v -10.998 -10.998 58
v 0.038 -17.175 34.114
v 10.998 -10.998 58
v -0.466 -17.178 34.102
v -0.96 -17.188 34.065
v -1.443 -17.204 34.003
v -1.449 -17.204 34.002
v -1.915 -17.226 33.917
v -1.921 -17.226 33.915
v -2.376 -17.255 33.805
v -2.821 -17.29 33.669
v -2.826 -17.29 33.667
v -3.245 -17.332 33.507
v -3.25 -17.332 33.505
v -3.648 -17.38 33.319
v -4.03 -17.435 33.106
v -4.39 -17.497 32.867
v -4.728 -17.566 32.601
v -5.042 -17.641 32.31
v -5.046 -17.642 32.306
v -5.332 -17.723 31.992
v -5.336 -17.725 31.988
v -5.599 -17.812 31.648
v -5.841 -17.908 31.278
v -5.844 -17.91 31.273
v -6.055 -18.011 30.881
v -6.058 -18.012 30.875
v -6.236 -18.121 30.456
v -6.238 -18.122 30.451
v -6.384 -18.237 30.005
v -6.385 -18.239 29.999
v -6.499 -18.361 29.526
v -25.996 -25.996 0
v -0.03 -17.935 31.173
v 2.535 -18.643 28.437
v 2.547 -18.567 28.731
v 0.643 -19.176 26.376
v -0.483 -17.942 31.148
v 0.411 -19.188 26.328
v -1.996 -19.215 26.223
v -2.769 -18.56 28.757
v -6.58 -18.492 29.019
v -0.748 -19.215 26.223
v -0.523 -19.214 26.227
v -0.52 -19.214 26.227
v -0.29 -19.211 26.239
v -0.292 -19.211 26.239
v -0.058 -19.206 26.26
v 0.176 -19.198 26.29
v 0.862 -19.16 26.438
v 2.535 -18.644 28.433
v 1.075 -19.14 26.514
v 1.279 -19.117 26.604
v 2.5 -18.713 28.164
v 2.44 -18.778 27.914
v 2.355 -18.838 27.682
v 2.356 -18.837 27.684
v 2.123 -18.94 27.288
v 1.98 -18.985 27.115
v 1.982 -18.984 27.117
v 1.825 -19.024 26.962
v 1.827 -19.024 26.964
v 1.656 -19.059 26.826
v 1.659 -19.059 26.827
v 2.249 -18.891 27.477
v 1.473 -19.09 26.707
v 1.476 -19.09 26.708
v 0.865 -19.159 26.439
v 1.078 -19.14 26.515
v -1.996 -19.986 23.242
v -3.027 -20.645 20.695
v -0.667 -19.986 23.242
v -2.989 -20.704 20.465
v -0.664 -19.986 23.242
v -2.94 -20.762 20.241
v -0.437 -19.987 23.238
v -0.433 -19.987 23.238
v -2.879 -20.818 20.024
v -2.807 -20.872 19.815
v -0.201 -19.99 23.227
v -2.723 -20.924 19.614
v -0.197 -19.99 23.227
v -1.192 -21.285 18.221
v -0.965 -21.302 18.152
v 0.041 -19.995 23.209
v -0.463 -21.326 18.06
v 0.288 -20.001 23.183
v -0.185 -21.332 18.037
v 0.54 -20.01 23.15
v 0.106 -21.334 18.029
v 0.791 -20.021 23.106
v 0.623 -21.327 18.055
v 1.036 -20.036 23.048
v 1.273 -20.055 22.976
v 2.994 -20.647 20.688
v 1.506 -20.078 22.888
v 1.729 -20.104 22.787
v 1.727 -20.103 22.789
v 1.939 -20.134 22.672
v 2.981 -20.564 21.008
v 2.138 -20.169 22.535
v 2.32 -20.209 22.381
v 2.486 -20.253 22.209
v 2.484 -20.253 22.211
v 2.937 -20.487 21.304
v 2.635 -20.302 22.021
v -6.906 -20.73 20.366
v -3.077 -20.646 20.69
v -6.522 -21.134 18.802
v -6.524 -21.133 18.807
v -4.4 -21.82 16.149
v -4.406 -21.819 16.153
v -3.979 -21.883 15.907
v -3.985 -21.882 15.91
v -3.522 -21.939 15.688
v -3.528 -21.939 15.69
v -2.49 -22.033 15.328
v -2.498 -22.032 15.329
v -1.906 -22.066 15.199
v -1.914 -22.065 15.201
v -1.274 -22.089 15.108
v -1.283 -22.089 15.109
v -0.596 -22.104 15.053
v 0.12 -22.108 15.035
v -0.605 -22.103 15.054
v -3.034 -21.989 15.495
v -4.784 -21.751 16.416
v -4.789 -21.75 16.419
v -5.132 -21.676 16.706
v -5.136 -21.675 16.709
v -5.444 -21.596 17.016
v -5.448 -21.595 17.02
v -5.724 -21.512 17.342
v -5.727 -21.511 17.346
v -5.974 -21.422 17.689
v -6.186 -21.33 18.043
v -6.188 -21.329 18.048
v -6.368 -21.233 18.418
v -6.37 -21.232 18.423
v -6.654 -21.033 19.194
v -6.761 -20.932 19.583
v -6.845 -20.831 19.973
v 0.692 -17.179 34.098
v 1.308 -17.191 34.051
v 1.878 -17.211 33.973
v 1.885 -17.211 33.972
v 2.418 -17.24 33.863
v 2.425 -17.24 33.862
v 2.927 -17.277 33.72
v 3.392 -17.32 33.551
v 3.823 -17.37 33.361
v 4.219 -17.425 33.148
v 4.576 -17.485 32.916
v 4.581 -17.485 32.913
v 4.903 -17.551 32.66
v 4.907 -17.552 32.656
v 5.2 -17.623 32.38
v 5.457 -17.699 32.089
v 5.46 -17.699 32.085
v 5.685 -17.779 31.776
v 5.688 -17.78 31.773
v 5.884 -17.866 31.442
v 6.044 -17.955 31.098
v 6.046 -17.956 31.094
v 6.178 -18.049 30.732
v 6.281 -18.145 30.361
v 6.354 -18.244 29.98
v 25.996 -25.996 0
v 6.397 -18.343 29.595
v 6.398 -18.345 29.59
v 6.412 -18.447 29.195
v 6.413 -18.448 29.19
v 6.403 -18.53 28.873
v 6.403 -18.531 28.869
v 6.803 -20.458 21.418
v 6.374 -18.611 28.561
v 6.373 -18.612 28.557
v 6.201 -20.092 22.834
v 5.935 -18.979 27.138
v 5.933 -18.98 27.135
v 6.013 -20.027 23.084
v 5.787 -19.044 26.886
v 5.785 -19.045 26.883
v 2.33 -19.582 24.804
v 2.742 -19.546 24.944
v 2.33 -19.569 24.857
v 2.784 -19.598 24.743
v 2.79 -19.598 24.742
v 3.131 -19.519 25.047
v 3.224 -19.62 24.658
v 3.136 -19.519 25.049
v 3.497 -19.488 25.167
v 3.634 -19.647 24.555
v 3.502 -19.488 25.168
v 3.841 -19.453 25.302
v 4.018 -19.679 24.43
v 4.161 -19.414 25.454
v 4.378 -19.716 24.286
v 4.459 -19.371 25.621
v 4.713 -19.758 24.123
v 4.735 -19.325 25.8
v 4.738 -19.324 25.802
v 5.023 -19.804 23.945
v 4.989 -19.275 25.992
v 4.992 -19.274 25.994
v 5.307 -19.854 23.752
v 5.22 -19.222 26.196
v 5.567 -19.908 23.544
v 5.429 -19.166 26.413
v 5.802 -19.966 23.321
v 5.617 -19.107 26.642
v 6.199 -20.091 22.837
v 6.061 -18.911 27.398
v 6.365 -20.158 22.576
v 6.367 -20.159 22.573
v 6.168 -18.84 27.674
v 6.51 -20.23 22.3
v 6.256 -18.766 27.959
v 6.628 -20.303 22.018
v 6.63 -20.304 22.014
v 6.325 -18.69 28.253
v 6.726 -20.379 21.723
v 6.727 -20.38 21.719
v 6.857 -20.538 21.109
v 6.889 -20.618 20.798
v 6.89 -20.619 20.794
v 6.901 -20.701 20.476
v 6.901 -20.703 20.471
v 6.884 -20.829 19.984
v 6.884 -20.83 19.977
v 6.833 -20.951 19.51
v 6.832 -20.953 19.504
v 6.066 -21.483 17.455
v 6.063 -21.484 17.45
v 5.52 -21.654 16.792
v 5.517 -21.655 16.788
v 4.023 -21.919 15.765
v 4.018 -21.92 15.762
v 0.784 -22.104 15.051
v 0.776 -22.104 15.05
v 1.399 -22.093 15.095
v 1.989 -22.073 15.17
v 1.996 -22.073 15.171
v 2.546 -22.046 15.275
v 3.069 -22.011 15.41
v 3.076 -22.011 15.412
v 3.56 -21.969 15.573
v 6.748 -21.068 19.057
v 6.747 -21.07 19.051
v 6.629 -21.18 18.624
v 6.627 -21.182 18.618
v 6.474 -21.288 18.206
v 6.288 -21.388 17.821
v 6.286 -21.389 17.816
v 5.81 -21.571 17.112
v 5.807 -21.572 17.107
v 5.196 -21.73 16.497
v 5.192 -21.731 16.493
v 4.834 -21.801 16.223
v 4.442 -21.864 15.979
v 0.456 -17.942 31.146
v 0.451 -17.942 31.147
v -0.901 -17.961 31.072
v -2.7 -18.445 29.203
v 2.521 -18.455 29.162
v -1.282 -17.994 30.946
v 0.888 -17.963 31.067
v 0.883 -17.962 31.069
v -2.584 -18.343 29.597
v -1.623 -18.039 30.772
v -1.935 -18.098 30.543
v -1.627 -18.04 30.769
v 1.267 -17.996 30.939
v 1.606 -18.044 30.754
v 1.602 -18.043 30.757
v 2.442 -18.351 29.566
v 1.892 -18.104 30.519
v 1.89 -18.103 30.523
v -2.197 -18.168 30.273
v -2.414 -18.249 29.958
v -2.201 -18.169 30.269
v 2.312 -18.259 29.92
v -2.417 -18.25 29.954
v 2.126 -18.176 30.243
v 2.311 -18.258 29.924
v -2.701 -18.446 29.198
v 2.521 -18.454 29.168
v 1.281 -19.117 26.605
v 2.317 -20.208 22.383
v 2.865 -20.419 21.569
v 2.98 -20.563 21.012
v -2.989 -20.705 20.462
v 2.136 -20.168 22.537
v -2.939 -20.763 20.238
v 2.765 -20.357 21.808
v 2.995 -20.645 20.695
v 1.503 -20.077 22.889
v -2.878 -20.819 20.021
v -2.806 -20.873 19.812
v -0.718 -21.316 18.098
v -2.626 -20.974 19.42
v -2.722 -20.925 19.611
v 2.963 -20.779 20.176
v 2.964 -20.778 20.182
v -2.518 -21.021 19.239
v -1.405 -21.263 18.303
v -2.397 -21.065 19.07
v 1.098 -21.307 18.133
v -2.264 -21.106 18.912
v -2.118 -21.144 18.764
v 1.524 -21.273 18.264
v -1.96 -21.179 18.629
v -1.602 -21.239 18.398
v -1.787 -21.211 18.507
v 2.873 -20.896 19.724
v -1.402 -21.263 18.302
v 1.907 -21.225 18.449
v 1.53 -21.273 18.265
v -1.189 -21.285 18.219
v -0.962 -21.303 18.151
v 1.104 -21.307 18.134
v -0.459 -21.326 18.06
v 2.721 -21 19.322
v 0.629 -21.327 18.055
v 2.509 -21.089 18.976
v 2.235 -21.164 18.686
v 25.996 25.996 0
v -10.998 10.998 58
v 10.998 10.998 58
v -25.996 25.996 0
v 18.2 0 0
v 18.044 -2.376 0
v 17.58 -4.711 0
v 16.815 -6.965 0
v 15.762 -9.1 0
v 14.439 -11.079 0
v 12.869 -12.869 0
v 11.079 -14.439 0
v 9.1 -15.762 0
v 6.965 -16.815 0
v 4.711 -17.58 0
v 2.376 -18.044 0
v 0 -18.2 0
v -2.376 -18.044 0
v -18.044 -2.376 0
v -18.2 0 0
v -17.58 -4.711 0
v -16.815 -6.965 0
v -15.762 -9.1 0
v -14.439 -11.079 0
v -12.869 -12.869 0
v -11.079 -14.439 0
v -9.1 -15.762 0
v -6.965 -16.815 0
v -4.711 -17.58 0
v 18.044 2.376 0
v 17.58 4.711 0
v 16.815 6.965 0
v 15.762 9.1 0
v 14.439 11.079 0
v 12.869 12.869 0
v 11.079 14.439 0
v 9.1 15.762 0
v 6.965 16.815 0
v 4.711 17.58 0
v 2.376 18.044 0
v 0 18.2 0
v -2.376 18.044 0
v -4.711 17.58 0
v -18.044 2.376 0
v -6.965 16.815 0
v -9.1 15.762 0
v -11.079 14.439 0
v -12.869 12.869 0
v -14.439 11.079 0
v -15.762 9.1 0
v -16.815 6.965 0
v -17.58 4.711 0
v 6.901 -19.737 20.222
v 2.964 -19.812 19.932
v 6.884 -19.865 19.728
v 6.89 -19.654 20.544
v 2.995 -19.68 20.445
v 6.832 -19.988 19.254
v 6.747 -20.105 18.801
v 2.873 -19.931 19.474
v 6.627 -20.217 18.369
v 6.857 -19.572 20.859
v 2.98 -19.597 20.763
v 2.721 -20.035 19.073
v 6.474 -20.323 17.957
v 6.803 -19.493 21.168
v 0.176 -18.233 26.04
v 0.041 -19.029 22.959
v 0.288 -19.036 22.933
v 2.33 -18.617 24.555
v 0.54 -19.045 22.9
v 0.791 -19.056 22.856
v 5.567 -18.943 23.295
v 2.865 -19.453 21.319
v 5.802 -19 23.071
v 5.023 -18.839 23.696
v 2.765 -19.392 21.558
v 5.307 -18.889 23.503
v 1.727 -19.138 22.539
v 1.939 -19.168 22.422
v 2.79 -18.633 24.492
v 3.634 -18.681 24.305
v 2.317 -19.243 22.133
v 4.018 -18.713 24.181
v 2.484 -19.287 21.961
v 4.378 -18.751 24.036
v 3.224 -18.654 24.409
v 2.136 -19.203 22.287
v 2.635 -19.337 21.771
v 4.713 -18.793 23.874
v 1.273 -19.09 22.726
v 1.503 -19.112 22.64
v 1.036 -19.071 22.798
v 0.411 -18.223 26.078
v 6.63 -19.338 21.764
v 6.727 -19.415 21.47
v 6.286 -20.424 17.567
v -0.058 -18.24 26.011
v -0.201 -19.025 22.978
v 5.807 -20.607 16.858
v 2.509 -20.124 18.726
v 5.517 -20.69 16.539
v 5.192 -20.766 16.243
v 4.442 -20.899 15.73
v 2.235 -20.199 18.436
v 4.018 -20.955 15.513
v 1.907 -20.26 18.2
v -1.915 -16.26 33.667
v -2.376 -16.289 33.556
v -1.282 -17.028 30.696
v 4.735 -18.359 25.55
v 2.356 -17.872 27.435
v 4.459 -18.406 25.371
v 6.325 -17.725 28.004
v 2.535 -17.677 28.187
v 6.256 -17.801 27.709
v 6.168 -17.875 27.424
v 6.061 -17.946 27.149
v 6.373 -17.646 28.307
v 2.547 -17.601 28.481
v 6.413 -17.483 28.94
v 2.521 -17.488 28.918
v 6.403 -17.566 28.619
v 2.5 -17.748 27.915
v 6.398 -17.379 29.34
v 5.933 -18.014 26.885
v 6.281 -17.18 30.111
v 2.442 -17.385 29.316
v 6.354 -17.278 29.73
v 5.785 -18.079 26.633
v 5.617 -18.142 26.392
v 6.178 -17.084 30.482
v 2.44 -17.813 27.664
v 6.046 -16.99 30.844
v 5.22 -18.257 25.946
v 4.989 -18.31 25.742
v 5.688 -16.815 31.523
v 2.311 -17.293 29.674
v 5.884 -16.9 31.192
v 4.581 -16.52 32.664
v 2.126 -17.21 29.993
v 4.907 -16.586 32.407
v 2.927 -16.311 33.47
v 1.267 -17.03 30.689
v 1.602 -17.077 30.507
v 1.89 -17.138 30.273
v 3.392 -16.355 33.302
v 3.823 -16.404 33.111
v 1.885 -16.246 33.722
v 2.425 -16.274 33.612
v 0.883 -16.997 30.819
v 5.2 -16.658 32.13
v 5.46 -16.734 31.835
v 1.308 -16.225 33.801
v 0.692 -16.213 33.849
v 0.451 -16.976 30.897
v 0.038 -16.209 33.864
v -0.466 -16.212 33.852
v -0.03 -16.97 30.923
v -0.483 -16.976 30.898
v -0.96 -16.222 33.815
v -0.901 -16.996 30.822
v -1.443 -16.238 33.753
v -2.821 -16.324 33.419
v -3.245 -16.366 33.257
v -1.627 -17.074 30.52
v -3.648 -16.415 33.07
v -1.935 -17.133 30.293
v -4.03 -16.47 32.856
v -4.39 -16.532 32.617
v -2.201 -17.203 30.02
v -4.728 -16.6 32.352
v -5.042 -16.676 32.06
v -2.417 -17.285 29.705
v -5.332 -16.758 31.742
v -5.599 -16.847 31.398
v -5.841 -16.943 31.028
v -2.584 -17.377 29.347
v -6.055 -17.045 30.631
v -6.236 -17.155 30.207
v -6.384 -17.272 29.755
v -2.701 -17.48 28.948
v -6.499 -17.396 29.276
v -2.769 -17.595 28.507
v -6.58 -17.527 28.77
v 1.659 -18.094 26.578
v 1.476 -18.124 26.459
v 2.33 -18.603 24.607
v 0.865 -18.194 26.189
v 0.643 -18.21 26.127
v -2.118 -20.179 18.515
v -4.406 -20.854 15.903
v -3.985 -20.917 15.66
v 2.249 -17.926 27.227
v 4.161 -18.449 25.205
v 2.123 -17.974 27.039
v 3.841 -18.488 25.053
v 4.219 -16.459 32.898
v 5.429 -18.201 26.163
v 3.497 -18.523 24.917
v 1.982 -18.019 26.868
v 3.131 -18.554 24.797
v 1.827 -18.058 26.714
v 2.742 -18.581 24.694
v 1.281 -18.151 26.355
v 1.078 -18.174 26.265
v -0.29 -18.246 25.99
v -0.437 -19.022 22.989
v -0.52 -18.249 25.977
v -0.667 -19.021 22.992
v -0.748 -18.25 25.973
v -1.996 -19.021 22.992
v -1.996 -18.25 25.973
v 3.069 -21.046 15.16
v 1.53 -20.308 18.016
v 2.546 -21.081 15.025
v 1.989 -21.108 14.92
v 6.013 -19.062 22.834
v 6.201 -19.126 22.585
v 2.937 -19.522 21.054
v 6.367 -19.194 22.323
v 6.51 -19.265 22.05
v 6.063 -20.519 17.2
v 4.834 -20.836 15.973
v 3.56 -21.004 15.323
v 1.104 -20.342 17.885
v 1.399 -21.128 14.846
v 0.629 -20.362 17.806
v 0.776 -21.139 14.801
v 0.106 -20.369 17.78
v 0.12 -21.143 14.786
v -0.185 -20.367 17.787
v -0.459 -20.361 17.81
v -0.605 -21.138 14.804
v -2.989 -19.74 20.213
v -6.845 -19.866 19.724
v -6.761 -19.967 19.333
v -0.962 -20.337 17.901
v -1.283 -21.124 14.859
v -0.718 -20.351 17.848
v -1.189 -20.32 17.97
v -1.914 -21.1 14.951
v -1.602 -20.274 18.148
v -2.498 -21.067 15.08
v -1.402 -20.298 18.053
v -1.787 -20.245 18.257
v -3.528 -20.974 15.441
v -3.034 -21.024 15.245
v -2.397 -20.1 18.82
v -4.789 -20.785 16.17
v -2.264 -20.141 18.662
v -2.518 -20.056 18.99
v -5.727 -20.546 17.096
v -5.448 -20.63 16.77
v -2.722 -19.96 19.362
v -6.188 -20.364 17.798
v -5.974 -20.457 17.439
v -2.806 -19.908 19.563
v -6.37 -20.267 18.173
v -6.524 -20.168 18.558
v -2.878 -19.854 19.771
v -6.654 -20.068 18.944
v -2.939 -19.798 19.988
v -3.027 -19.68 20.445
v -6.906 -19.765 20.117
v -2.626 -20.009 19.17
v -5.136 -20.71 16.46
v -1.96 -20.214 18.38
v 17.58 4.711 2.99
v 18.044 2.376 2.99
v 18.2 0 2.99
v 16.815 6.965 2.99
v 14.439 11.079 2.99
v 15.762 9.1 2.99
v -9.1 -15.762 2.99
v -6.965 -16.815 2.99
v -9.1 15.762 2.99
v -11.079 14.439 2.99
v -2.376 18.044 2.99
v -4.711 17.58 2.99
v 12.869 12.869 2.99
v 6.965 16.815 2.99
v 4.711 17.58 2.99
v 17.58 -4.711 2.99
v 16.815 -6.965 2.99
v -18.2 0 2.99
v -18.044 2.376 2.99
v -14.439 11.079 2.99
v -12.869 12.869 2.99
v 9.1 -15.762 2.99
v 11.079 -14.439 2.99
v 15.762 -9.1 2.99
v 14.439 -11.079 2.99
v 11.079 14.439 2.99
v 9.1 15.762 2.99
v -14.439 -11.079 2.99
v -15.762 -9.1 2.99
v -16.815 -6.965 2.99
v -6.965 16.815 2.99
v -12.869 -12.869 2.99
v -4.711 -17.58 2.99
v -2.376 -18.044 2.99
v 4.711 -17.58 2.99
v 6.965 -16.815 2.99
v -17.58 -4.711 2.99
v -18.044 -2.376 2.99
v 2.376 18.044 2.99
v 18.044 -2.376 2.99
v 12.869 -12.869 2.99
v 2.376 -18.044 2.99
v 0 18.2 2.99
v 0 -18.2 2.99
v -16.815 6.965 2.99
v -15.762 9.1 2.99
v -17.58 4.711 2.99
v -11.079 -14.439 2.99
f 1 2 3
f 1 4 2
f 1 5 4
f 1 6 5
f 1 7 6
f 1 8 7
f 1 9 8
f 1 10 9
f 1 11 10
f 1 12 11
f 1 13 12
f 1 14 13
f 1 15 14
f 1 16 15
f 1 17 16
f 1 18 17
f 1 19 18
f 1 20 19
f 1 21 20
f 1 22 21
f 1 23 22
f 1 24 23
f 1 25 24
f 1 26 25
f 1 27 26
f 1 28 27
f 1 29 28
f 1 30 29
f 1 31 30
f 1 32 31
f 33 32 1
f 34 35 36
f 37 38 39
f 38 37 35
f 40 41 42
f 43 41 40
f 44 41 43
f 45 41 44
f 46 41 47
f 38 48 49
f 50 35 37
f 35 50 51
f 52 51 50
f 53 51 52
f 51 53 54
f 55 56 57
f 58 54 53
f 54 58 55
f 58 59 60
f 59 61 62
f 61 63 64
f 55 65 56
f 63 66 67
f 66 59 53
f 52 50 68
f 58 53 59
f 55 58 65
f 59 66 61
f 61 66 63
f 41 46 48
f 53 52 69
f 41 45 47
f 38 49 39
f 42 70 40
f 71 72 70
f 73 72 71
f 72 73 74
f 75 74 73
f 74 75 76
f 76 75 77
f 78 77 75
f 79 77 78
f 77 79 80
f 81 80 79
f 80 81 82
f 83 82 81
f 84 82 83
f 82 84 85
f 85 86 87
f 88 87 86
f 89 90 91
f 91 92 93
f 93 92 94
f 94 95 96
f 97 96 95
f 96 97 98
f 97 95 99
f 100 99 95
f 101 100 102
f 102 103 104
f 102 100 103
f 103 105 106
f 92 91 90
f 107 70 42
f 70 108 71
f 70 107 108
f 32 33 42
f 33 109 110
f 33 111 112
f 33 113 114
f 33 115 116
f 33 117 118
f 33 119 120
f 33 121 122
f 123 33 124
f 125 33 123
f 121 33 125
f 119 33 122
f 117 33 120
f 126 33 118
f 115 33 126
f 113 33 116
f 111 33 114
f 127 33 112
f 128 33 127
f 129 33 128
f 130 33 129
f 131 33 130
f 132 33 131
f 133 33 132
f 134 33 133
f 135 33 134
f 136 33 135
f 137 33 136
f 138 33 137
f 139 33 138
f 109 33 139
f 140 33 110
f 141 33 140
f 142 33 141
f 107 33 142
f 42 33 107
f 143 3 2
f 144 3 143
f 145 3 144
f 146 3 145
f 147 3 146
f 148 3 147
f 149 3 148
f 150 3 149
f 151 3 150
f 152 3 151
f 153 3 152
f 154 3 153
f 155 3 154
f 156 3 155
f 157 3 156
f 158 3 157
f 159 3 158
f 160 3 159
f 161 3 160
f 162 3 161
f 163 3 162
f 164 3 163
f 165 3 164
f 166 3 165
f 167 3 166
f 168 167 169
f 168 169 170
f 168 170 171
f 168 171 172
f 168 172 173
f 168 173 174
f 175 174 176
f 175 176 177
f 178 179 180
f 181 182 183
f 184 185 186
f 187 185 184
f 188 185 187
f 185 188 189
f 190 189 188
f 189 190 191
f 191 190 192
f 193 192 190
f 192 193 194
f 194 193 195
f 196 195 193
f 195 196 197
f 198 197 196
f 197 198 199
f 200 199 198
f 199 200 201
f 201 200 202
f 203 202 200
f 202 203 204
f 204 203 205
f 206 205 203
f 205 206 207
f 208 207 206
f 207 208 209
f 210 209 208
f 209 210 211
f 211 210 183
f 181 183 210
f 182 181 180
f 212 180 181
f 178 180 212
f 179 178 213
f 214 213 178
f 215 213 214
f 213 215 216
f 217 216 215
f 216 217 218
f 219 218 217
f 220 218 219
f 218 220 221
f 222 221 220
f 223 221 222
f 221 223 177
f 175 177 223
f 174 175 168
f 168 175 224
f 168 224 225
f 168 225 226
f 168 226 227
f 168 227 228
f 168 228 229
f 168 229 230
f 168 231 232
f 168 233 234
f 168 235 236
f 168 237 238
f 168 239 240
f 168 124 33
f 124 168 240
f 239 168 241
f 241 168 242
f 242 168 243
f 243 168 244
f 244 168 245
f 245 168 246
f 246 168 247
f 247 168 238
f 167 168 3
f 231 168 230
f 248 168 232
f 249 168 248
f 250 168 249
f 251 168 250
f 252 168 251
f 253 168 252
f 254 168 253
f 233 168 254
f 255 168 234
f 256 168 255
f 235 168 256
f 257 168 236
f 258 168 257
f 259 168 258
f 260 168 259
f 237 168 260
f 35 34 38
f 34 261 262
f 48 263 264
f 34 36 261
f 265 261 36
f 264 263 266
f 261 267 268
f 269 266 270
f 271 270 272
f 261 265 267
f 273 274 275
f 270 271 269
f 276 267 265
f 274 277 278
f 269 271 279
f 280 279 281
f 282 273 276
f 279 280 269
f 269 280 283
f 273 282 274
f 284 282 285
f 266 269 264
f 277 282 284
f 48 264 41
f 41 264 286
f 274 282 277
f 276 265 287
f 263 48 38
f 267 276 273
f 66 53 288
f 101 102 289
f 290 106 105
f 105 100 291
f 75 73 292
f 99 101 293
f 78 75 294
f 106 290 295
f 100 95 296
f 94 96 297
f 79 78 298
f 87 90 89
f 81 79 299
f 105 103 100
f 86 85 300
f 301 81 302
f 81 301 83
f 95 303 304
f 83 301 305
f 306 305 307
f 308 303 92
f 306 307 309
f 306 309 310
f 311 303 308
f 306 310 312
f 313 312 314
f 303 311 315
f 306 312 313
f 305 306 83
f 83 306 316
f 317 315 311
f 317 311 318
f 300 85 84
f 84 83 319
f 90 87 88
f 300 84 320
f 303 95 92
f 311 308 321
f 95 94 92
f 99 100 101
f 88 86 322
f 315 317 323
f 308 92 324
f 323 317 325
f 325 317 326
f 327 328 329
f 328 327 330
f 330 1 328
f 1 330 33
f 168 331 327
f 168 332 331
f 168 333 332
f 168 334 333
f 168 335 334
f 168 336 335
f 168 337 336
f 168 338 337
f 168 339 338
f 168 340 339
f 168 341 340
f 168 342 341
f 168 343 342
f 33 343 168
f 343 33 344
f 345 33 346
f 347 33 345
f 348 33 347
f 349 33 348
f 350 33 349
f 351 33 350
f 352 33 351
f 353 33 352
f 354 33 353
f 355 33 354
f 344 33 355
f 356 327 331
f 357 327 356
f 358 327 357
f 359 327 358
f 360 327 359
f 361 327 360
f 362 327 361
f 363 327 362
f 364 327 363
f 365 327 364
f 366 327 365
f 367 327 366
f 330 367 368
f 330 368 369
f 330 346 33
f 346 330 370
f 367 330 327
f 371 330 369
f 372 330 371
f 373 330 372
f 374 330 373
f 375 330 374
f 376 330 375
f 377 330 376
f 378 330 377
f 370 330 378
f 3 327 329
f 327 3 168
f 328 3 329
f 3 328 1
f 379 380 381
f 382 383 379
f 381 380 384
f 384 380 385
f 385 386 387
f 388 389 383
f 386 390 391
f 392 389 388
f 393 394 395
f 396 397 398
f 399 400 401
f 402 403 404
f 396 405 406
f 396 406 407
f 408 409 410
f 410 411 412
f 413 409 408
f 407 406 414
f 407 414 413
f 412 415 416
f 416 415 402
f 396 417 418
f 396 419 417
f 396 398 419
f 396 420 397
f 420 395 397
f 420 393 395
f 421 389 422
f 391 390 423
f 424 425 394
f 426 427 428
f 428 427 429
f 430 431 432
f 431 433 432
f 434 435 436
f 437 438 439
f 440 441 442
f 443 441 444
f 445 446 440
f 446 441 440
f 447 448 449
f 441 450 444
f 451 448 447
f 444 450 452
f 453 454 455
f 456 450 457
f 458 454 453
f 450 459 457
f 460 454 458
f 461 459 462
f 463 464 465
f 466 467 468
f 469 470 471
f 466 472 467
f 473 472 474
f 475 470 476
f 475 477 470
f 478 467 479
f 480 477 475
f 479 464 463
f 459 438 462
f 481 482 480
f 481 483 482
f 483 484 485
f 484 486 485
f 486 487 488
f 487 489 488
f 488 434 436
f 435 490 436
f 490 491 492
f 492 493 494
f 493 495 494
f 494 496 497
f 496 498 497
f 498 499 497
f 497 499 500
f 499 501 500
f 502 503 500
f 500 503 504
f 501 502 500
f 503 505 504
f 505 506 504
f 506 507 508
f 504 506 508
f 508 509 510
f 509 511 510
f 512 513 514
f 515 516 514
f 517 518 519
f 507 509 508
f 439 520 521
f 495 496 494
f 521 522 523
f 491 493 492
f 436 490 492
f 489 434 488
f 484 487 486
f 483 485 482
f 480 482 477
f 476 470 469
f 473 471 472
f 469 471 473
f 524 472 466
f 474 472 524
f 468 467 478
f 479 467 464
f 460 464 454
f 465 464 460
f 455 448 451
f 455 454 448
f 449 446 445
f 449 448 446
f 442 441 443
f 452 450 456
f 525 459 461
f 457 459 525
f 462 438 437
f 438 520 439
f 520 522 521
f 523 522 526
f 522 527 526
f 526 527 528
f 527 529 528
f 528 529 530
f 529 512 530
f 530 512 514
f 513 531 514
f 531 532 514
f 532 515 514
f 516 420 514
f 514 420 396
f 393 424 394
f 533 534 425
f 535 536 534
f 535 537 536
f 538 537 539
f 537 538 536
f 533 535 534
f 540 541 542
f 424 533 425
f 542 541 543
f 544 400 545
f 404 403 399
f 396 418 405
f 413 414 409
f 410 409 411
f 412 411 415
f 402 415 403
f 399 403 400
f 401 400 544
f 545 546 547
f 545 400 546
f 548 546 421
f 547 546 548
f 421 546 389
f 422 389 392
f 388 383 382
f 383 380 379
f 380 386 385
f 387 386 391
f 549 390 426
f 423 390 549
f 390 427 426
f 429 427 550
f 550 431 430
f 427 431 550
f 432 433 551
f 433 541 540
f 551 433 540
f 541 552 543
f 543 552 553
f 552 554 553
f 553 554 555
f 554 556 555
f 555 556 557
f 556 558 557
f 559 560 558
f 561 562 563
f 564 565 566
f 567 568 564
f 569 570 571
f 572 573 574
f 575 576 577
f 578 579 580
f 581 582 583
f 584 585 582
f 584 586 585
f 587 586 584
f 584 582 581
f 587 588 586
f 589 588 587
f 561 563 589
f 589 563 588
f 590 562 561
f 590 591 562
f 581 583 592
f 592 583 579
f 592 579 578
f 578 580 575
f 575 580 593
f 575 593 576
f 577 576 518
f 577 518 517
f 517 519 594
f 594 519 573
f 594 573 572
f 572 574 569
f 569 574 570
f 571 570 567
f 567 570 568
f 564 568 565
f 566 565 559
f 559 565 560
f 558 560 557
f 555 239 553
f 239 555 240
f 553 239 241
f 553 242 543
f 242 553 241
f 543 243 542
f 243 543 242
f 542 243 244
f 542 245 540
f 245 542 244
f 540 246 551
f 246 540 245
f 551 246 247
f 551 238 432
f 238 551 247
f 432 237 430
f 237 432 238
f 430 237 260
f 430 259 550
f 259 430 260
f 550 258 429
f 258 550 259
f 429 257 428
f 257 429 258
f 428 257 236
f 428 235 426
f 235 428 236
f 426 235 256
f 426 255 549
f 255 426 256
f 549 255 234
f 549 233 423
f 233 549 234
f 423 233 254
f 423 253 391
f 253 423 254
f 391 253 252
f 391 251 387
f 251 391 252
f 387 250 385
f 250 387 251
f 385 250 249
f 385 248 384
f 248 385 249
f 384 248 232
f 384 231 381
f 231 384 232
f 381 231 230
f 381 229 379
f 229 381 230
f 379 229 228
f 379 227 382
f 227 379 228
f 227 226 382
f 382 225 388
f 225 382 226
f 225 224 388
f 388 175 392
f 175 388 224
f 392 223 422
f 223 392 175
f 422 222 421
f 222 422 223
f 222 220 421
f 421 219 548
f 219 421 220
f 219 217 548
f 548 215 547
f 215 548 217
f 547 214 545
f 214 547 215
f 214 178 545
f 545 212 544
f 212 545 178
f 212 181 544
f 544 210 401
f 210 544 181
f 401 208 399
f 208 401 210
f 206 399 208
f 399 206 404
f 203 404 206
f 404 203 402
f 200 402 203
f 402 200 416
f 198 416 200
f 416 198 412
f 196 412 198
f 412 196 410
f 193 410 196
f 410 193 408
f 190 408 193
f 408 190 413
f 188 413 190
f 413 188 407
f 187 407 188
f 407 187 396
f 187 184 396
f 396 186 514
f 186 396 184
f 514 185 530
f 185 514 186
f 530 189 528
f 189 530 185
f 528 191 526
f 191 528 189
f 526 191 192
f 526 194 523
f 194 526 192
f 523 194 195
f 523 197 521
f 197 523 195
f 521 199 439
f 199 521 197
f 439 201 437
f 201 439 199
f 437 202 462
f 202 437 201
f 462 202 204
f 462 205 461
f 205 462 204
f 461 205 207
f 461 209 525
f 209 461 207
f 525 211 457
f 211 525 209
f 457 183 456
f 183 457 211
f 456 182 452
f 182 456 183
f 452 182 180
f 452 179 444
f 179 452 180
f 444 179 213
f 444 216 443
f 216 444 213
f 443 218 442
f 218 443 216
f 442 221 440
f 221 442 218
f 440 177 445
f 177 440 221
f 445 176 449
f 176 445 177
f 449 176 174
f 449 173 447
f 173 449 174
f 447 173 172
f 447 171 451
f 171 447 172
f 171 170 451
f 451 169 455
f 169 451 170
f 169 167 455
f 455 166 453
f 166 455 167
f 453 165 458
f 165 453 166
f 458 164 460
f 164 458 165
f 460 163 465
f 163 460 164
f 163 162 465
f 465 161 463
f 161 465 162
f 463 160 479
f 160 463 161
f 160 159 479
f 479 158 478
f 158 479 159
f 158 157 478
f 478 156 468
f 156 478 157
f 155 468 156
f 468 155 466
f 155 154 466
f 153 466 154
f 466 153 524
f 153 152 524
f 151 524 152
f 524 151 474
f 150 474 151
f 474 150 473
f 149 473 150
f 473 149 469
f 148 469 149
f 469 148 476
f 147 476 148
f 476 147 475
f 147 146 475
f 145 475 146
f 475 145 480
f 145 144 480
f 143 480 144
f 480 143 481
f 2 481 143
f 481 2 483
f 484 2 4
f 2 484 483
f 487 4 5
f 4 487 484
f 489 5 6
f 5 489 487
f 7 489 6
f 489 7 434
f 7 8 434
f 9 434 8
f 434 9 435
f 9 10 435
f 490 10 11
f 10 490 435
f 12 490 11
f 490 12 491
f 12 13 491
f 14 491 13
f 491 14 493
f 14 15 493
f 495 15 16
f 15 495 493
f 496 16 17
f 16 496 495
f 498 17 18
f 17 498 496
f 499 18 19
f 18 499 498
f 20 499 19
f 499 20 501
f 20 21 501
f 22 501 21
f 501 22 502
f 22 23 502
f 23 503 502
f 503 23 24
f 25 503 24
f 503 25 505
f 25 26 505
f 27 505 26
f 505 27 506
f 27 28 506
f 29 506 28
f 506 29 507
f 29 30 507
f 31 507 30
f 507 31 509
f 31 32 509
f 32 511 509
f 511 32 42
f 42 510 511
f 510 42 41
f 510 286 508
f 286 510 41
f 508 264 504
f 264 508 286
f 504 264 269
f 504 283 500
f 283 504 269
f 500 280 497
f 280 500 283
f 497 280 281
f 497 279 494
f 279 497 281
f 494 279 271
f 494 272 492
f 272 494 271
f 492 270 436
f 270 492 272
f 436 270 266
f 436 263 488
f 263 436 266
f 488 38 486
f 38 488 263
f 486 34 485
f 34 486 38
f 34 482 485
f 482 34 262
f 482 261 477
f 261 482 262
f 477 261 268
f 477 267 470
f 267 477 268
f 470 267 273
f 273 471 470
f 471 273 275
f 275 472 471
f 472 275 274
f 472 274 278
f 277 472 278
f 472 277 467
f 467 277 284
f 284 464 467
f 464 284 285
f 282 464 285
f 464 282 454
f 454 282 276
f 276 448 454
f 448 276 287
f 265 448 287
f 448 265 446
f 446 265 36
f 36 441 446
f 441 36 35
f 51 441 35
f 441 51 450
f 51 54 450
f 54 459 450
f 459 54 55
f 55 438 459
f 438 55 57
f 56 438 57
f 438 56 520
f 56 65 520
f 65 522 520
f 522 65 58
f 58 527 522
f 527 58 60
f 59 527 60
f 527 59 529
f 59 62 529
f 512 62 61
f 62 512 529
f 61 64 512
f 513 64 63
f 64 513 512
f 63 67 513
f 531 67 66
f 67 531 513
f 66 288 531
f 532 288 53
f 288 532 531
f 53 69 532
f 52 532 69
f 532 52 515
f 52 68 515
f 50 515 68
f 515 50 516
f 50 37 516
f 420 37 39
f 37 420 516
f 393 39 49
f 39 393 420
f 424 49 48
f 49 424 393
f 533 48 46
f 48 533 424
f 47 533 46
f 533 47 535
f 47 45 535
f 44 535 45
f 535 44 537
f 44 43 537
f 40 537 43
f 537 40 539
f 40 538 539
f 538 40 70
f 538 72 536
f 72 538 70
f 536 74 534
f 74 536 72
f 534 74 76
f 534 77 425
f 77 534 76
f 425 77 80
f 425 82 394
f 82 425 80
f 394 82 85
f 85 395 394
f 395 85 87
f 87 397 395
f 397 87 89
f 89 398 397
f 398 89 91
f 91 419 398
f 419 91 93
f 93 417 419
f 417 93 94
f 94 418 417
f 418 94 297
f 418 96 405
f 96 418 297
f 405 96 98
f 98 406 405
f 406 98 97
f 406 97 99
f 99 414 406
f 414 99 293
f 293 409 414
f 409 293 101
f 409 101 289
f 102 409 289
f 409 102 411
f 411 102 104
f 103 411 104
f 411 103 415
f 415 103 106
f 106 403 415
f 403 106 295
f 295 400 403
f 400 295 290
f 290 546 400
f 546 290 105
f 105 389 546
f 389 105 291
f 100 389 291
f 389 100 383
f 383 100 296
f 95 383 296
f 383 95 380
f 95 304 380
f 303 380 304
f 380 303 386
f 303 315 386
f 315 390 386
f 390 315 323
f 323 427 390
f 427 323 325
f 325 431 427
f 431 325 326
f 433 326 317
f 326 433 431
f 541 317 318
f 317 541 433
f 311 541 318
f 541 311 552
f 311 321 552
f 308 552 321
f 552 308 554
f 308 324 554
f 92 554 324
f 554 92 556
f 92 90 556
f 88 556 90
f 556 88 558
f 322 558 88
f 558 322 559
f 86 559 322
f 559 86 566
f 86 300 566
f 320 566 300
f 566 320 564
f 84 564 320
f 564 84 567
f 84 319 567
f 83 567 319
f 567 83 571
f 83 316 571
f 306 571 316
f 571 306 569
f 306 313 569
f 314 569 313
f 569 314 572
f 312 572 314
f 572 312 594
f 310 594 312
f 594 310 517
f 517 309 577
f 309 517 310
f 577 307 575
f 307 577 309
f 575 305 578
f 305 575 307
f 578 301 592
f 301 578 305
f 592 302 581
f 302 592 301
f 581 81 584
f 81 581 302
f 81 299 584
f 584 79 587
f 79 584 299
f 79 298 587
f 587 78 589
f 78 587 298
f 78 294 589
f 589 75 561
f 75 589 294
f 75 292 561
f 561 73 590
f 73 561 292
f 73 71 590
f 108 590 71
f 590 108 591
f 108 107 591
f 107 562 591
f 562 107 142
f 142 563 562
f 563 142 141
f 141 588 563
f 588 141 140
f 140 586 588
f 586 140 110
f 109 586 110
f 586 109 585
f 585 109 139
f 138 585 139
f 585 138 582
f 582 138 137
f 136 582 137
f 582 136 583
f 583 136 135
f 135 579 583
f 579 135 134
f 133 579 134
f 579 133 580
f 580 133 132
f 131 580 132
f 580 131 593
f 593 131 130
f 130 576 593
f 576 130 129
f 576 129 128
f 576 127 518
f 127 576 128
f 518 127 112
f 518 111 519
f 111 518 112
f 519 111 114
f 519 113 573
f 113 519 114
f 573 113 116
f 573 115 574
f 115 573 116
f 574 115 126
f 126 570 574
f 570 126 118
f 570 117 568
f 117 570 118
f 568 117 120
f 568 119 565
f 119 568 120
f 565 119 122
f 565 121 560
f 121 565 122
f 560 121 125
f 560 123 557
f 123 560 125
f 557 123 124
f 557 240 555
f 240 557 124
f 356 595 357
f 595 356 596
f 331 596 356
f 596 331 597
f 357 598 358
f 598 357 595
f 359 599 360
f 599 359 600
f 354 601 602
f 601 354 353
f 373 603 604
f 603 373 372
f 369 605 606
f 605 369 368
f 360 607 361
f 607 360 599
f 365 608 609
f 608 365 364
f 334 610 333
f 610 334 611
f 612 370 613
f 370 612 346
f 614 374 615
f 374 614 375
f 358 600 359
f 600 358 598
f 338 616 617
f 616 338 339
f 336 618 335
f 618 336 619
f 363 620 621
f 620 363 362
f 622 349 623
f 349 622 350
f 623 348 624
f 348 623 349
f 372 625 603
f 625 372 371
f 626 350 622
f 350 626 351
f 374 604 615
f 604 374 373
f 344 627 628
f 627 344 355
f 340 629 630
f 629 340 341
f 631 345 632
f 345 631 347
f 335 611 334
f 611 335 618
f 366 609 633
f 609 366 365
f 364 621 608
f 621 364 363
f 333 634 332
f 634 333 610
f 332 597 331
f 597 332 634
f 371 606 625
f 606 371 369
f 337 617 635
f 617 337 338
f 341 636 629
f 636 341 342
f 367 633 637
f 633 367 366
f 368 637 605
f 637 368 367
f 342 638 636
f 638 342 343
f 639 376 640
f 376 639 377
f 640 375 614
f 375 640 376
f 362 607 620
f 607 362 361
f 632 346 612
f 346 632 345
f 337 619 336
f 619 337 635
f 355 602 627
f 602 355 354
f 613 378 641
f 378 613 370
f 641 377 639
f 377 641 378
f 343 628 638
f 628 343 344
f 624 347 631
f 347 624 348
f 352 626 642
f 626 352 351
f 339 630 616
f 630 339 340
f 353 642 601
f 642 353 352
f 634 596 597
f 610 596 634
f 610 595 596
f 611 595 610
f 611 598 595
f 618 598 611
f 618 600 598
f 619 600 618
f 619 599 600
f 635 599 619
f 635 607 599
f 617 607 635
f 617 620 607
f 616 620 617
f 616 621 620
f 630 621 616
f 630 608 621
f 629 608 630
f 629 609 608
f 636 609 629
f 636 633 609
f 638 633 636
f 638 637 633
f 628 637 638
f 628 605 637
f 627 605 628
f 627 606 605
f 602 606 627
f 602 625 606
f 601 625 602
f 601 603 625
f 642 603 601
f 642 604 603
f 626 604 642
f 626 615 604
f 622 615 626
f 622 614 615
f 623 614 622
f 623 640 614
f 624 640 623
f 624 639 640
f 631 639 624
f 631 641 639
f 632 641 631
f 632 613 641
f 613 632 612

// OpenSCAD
// file: comun.scad
// GolfCraft3D — Conos de distancia para putt (diseño propio, 2 colores). Set de 5 conos numerados del 1 al 5:
// se ponen a 1, 2, 3, 4 y 5 metros del hoyo para el ejercicio de la escalera. Se imprimen parados, sin soportes.
numero = "3";
base = 52; tope = 22; alto = 58;
inc = atan((base - tope) / 2 / alto);
$fn = 4;
module cono() rotate(45) cylinder(d1 = base * 1.414, d2 = tope * 1.414, h = alto);
module cifra(prof) translate([0, -(base / 2 - (base - tope) / 2 * 0.42), alto * 0.42]) rotate([90 - inc, 0, 0]) translate([0, 0, -prof]) linear_extrude(prof + 0.01) text(numero, size = 20, halign = "center", valign = "center", font = "Liberation Sans:style=Bold", $fn = 32);
// main file
include <comun.scad>
difference() { cono(); cifra(1); translate([0, 0, -0.01]) cylinder(d = base * 0.7, h = 3, $fn = 48); }
